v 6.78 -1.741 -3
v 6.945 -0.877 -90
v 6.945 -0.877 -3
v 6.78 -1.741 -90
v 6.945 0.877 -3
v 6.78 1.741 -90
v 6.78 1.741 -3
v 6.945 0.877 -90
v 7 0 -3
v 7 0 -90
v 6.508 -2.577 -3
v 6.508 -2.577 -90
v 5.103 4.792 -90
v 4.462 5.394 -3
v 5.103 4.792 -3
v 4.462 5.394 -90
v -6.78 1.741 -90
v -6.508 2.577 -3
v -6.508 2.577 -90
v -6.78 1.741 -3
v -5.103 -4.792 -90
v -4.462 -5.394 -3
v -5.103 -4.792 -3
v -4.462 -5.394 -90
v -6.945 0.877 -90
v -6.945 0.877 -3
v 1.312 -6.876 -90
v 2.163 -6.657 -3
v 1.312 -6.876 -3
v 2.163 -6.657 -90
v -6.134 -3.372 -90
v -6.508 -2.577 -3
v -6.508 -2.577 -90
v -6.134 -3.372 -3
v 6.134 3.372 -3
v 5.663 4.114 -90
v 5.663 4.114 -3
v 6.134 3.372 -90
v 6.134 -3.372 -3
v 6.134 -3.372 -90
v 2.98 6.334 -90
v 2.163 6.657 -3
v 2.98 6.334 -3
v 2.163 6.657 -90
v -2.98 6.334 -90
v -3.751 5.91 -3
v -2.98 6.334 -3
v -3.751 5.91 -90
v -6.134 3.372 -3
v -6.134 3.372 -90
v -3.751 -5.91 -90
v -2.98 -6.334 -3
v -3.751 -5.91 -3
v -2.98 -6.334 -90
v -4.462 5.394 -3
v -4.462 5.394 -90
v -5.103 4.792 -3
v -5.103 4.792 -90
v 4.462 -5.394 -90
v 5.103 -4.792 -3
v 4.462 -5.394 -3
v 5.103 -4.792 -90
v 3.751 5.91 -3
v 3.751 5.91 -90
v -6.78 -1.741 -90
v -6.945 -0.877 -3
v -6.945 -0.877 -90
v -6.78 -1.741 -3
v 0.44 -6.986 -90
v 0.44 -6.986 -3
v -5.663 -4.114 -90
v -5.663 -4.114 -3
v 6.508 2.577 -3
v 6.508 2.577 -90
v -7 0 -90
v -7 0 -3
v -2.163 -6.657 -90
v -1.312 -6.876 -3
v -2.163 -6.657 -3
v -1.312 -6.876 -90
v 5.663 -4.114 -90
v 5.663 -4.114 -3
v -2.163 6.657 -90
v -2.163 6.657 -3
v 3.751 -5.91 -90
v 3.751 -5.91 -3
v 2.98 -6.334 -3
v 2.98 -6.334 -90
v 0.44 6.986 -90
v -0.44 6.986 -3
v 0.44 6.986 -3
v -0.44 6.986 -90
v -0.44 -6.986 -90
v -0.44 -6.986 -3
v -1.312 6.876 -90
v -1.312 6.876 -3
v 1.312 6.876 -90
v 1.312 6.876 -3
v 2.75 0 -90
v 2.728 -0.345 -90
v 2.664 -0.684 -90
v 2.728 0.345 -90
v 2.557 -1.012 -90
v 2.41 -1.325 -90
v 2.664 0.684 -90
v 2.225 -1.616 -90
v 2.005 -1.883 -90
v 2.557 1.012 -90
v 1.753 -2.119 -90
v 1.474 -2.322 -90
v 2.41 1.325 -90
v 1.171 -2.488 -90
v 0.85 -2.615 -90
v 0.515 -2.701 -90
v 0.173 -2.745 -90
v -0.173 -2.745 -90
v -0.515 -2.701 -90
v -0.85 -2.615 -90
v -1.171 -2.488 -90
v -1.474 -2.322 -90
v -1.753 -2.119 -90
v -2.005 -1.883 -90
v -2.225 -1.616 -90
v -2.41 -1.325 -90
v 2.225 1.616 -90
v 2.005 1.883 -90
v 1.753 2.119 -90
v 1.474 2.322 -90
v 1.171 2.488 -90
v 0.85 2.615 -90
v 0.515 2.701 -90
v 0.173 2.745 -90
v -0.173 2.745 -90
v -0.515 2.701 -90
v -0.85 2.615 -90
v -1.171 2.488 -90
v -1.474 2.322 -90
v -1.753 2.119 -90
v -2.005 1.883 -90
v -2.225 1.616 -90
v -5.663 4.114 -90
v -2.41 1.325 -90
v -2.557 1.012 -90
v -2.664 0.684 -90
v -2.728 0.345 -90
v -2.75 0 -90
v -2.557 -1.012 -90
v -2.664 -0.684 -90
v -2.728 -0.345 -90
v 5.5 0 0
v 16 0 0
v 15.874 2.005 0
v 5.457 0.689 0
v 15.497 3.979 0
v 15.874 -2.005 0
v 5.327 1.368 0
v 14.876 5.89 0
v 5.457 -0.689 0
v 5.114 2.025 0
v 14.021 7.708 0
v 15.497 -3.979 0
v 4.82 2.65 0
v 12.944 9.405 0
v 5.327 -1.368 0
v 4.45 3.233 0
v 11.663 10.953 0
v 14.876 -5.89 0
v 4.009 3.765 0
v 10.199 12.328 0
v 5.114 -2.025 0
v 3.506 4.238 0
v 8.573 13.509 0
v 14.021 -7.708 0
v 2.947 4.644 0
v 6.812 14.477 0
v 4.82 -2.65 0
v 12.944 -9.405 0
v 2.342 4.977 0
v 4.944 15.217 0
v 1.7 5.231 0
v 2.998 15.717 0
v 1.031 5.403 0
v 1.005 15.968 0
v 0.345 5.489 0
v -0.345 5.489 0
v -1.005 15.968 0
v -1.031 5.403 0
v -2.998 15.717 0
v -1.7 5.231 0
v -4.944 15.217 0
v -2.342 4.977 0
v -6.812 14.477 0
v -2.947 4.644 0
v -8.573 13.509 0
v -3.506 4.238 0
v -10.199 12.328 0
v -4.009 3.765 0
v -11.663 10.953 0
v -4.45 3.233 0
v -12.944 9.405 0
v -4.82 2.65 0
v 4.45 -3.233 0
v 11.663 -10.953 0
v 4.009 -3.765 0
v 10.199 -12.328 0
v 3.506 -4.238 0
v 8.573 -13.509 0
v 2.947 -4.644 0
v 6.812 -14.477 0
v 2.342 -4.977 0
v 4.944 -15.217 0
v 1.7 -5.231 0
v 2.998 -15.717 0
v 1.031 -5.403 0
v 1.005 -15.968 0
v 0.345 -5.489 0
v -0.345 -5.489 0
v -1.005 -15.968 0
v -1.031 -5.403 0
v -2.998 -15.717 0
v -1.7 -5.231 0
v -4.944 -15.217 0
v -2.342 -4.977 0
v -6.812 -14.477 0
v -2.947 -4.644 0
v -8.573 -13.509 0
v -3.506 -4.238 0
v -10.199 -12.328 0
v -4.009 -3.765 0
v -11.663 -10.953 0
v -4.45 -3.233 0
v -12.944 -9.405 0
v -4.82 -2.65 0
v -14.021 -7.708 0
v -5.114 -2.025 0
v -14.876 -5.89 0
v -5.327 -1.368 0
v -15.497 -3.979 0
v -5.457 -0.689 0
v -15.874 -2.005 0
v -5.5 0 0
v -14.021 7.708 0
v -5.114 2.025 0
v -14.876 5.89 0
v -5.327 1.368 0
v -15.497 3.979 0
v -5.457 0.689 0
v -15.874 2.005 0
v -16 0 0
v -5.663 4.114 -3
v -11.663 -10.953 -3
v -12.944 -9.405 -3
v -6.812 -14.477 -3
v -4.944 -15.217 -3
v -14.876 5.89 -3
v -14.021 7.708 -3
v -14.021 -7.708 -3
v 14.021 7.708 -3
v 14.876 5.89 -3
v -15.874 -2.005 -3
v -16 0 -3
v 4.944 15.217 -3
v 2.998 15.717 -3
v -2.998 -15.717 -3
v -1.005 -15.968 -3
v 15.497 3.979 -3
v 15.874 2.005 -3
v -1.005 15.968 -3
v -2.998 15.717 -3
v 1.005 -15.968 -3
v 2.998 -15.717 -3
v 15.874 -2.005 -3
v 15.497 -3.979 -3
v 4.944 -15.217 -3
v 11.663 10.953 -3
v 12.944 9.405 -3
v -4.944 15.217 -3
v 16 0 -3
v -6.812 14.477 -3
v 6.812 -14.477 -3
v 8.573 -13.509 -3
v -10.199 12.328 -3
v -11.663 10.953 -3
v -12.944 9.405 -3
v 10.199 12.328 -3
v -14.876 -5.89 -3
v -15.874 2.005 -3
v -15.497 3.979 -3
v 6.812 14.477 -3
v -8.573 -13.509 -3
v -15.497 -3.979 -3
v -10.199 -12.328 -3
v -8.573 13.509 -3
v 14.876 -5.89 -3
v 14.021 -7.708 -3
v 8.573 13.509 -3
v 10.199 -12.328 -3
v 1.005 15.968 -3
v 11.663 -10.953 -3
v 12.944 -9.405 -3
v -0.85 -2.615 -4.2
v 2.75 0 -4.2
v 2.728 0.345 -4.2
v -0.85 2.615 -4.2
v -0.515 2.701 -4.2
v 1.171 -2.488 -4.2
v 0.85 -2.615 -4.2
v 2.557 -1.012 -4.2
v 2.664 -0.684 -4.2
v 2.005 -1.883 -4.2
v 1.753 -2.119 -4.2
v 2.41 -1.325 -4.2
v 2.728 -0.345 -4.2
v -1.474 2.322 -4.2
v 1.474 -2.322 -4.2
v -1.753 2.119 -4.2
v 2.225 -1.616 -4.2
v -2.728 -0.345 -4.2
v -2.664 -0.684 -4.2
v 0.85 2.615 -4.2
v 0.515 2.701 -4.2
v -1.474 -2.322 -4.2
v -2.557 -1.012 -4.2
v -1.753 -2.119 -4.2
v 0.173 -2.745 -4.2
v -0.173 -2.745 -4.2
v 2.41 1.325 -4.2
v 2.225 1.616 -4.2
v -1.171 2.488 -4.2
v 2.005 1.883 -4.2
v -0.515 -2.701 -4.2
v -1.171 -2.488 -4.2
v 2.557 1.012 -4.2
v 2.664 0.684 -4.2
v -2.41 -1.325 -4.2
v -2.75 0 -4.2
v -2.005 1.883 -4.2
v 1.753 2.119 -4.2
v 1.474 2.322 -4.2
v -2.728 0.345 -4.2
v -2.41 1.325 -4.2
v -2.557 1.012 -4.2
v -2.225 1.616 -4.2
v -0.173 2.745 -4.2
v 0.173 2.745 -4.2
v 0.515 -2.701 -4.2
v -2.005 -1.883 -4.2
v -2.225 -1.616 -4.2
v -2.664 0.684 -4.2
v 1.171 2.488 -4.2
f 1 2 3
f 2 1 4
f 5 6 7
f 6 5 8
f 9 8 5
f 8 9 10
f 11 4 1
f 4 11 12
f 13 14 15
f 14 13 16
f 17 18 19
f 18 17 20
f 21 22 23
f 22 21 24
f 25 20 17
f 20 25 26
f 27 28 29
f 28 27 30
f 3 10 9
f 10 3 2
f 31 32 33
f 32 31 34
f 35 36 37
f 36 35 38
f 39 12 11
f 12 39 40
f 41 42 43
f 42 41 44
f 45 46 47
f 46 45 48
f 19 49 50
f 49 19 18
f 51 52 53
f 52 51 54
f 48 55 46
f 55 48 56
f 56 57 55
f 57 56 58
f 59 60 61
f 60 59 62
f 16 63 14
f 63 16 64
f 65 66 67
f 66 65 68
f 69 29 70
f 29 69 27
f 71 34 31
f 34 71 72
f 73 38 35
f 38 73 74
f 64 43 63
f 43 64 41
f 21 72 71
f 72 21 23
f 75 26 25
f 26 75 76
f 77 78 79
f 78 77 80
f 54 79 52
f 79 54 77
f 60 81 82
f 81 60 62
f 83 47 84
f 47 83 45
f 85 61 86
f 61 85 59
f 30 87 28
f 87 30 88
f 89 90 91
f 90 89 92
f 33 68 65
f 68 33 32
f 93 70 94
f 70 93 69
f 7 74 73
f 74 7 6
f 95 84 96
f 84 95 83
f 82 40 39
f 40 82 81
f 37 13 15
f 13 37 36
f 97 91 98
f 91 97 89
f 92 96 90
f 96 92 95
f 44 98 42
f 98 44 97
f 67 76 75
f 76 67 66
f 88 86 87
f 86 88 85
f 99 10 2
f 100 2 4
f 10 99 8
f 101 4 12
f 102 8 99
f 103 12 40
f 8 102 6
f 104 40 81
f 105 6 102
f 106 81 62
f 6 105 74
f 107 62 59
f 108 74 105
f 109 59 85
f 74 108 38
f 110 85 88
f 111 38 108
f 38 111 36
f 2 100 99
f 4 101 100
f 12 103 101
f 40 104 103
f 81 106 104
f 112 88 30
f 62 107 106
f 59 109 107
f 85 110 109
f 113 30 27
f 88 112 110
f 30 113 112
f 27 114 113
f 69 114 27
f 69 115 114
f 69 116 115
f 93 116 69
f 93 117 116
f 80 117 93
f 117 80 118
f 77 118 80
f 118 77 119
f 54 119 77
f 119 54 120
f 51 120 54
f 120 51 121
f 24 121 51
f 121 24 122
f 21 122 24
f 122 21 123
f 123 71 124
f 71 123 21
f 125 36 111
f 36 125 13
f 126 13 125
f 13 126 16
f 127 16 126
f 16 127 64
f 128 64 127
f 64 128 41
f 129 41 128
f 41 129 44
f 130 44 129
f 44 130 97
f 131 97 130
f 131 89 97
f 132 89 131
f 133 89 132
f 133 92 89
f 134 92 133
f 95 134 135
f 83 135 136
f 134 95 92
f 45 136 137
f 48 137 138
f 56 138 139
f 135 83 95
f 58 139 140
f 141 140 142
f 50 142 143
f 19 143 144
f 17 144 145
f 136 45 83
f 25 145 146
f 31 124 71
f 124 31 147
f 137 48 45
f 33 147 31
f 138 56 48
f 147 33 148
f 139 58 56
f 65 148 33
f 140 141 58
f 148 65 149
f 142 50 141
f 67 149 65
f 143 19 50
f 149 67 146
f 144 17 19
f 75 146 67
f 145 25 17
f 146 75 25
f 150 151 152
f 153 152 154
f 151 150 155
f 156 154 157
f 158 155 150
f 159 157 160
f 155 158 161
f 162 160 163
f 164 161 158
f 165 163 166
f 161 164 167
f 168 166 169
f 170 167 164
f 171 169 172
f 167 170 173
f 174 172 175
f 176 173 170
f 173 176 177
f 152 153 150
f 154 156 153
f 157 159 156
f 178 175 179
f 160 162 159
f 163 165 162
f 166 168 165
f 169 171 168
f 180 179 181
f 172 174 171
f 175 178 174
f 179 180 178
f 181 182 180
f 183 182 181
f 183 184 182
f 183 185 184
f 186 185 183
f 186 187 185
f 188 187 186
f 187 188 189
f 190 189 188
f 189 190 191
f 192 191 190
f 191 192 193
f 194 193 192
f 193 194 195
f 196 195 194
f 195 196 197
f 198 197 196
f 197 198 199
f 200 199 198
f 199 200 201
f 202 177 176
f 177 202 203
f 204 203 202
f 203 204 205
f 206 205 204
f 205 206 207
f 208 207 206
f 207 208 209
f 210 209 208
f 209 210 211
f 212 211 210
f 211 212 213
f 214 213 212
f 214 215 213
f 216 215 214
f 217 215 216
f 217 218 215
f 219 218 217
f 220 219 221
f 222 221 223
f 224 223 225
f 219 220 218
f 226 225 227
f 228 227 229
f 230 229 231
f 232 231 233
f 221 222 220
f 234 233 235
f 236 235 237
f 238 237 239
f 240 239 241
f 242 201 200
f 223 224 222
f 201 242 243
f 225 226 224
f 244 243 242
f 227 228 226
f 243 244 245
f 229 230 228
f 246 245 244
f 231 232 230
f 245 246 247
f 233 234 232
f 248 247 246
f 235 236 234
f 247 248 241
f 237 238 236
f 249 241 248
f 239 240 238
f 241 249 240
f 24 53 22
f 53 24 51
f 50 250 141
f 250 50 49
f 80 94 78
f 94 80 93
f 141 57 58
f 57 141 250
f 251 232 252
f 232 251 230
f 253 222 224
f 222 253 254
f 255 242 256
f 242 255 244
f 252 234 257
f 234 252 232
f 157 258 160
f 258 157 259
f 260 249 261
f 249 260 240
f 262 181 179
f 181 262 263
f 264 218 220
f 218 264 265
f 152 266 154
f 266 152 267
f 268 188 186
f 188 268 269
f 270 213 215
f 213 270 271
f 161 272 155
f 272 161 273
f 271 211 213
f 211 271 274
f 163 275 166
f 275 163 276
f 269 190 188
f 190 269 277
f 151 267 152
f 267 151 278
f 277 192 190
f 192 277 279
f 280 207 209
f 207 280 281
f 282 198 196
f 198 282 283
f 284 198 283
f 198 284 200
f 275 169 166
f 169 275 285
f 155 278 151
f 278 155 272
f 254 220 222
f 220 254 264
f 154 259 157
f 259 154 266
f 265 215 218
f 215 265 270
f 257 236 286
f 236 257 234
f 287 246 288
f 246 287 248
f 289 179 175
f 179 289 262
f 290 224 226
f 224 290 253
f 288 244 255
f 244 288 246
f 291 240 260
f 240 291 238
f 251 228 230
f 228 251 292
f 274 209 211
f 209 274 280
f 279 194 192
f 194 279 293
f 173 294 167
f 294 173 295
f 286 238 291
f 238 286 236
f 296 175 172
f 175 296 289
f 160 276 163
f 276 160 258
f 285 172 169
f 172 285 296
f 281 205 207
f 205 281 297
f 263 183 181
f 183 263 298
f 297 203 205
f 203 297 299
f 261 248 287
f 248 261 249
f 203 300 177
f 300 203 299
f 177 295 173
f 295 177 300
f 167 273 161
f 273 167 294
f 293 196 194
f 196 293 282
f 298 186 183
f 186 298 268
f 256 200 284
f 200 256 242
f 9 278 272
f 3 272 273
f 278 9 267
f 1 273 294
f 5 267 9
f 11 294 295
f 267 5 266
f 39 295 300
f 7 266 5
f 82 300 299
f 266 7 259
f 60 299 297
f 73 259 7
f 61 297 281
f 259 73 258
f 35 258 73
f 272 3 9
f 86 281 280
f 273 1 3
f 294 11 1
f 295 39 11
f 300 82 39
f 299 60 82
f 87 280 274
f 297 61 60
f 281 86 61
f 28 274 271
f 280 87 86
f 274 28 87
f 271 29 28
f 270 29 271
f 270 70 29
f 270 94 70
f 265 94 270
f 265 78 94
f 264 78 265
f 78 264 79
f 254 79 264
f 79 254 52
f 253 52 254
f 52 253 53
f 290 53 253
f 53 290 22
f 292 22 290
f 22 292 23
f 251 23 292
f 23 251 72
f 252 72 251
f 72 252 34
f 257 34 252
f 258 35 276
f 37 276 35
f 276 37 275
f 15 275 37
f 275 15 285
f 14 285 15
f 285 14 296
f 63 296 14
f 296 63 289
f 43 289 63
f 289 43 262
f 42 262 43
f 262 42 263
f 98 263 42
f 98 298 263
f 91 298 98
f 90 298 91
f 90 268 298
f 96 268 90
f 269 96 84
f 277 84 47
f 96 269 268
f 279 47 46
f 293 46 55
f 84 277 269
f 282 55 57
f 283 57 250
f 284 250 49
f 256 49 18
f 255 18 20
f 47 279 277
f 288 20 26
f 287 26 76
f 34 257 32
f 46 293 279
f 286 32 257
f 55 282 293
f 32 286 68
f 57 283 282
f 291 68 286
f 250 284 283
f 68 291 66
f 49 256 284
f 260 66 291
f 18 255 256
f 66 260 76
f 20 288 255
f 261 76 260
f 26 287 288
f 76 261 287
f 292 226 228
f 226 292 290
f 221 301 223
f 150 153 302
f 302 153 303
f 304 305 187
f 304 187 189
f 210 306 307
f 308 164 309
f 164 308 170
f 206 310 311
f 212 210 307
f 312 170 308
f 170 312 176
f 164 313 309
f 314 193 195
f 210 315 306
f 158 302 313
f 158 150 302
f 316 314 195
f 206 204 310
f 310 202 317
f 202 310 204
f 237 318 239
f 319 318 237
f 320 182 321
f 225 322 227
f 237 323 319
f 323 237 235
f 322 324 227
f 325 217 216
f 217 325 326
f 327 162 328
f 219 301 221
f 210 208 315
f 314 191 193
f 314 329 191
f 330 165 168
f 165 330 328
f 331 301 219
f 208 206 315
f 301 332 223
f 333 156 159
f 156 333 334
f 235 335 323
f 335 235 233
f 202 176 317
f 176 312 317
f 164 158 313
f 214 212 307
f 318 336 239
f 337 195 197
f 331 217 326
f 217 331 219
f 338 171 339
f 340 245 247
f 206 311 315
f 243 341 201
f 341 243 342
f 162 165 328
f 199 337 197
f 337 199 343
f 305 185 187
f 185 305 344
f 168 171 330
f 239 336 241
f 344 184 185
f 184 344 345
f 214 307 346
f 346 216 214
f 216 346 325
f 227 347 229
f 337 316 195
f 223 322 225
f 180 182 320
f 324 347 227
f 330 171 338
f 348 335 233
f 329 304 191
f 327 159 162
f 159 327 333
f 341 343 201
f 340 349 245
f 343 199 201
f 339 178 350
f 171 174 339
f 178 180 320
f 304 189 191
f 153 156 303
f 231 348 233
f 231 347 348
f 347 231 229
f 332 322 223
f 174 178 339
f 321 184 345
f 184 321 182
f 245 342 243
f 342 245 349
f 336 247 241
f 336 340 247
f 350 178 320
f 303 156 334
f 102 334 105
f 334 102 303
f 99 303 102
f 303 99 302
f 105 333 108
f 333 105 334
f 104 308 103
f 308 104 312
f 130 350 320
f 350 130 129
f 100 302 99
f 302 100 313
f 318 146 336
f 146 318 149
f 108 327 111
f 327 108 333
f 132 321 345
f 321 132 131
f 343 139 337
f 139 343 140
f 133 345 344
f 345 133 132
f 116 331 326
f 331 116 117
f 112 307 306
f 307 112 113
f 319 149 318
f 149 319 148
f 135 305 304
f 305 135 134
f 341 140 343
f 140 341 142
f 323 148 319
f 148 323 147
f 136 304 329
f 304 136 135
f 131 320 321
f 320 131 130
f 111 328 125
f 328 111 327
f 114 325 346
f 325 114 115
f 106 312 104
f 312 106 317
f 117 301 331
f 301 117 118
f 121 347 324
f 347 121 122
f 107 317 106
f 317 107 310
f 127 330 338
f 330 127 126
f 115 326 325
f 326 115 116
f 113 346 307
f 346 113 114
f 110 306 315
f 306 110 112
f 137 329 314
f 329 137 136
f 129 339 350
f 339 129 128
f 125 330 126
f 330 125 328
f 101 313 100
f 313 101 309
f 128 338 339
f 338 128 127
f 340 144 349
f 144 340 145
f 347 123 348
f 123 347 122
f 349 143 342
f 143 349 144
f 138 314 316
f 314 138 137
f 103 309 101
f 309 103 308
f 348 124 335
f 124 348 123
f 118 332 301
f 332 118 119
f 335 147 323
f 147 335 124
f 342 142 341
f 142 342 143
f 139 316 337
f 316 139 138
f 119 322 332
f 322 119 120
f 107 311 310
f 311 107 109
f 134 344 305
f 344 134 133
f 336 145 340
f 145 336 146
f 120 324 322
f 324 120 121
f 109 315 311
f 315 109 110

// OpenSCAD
$fn = 50;


difference() {
	union() {
		translate(v = [0, 0, -90.0000000000]) {
			cylinder(h = 90, r = 7.0000000000);
		}
		translate(v = [0, 0, -3.0000000000]) {
			cylinder(h = 3, r = 16.0000000000);
		}
	}
	union() {
		translate(v = [0, 0, 0]) {
			rotate(a = [0, 0, 0]) {
				difference() {
					union() {
						#translate(v = [0, 0, -90.0000000000]) {
							cylinder(h = 90, r = 2.2500000000);
						}
						#translate(v = [0, 0, -4.2000000000]) {
							cylinder(h = 4.2000000000, r = 7.0000000000, r1 = 2.7500000000, r2 = 5.5000000000);
						}
						#translate(v = [0, 0, -90.0000000000]) {
							cylinder(h = 90, r = 2.7500000000);
						}
						#translate(v = [0, 0, -90.0000000000]) {
							cylinder(h = 90, r = 2.2500000000);
						}
					}
					union();
				}
			}
		}
	}
}
